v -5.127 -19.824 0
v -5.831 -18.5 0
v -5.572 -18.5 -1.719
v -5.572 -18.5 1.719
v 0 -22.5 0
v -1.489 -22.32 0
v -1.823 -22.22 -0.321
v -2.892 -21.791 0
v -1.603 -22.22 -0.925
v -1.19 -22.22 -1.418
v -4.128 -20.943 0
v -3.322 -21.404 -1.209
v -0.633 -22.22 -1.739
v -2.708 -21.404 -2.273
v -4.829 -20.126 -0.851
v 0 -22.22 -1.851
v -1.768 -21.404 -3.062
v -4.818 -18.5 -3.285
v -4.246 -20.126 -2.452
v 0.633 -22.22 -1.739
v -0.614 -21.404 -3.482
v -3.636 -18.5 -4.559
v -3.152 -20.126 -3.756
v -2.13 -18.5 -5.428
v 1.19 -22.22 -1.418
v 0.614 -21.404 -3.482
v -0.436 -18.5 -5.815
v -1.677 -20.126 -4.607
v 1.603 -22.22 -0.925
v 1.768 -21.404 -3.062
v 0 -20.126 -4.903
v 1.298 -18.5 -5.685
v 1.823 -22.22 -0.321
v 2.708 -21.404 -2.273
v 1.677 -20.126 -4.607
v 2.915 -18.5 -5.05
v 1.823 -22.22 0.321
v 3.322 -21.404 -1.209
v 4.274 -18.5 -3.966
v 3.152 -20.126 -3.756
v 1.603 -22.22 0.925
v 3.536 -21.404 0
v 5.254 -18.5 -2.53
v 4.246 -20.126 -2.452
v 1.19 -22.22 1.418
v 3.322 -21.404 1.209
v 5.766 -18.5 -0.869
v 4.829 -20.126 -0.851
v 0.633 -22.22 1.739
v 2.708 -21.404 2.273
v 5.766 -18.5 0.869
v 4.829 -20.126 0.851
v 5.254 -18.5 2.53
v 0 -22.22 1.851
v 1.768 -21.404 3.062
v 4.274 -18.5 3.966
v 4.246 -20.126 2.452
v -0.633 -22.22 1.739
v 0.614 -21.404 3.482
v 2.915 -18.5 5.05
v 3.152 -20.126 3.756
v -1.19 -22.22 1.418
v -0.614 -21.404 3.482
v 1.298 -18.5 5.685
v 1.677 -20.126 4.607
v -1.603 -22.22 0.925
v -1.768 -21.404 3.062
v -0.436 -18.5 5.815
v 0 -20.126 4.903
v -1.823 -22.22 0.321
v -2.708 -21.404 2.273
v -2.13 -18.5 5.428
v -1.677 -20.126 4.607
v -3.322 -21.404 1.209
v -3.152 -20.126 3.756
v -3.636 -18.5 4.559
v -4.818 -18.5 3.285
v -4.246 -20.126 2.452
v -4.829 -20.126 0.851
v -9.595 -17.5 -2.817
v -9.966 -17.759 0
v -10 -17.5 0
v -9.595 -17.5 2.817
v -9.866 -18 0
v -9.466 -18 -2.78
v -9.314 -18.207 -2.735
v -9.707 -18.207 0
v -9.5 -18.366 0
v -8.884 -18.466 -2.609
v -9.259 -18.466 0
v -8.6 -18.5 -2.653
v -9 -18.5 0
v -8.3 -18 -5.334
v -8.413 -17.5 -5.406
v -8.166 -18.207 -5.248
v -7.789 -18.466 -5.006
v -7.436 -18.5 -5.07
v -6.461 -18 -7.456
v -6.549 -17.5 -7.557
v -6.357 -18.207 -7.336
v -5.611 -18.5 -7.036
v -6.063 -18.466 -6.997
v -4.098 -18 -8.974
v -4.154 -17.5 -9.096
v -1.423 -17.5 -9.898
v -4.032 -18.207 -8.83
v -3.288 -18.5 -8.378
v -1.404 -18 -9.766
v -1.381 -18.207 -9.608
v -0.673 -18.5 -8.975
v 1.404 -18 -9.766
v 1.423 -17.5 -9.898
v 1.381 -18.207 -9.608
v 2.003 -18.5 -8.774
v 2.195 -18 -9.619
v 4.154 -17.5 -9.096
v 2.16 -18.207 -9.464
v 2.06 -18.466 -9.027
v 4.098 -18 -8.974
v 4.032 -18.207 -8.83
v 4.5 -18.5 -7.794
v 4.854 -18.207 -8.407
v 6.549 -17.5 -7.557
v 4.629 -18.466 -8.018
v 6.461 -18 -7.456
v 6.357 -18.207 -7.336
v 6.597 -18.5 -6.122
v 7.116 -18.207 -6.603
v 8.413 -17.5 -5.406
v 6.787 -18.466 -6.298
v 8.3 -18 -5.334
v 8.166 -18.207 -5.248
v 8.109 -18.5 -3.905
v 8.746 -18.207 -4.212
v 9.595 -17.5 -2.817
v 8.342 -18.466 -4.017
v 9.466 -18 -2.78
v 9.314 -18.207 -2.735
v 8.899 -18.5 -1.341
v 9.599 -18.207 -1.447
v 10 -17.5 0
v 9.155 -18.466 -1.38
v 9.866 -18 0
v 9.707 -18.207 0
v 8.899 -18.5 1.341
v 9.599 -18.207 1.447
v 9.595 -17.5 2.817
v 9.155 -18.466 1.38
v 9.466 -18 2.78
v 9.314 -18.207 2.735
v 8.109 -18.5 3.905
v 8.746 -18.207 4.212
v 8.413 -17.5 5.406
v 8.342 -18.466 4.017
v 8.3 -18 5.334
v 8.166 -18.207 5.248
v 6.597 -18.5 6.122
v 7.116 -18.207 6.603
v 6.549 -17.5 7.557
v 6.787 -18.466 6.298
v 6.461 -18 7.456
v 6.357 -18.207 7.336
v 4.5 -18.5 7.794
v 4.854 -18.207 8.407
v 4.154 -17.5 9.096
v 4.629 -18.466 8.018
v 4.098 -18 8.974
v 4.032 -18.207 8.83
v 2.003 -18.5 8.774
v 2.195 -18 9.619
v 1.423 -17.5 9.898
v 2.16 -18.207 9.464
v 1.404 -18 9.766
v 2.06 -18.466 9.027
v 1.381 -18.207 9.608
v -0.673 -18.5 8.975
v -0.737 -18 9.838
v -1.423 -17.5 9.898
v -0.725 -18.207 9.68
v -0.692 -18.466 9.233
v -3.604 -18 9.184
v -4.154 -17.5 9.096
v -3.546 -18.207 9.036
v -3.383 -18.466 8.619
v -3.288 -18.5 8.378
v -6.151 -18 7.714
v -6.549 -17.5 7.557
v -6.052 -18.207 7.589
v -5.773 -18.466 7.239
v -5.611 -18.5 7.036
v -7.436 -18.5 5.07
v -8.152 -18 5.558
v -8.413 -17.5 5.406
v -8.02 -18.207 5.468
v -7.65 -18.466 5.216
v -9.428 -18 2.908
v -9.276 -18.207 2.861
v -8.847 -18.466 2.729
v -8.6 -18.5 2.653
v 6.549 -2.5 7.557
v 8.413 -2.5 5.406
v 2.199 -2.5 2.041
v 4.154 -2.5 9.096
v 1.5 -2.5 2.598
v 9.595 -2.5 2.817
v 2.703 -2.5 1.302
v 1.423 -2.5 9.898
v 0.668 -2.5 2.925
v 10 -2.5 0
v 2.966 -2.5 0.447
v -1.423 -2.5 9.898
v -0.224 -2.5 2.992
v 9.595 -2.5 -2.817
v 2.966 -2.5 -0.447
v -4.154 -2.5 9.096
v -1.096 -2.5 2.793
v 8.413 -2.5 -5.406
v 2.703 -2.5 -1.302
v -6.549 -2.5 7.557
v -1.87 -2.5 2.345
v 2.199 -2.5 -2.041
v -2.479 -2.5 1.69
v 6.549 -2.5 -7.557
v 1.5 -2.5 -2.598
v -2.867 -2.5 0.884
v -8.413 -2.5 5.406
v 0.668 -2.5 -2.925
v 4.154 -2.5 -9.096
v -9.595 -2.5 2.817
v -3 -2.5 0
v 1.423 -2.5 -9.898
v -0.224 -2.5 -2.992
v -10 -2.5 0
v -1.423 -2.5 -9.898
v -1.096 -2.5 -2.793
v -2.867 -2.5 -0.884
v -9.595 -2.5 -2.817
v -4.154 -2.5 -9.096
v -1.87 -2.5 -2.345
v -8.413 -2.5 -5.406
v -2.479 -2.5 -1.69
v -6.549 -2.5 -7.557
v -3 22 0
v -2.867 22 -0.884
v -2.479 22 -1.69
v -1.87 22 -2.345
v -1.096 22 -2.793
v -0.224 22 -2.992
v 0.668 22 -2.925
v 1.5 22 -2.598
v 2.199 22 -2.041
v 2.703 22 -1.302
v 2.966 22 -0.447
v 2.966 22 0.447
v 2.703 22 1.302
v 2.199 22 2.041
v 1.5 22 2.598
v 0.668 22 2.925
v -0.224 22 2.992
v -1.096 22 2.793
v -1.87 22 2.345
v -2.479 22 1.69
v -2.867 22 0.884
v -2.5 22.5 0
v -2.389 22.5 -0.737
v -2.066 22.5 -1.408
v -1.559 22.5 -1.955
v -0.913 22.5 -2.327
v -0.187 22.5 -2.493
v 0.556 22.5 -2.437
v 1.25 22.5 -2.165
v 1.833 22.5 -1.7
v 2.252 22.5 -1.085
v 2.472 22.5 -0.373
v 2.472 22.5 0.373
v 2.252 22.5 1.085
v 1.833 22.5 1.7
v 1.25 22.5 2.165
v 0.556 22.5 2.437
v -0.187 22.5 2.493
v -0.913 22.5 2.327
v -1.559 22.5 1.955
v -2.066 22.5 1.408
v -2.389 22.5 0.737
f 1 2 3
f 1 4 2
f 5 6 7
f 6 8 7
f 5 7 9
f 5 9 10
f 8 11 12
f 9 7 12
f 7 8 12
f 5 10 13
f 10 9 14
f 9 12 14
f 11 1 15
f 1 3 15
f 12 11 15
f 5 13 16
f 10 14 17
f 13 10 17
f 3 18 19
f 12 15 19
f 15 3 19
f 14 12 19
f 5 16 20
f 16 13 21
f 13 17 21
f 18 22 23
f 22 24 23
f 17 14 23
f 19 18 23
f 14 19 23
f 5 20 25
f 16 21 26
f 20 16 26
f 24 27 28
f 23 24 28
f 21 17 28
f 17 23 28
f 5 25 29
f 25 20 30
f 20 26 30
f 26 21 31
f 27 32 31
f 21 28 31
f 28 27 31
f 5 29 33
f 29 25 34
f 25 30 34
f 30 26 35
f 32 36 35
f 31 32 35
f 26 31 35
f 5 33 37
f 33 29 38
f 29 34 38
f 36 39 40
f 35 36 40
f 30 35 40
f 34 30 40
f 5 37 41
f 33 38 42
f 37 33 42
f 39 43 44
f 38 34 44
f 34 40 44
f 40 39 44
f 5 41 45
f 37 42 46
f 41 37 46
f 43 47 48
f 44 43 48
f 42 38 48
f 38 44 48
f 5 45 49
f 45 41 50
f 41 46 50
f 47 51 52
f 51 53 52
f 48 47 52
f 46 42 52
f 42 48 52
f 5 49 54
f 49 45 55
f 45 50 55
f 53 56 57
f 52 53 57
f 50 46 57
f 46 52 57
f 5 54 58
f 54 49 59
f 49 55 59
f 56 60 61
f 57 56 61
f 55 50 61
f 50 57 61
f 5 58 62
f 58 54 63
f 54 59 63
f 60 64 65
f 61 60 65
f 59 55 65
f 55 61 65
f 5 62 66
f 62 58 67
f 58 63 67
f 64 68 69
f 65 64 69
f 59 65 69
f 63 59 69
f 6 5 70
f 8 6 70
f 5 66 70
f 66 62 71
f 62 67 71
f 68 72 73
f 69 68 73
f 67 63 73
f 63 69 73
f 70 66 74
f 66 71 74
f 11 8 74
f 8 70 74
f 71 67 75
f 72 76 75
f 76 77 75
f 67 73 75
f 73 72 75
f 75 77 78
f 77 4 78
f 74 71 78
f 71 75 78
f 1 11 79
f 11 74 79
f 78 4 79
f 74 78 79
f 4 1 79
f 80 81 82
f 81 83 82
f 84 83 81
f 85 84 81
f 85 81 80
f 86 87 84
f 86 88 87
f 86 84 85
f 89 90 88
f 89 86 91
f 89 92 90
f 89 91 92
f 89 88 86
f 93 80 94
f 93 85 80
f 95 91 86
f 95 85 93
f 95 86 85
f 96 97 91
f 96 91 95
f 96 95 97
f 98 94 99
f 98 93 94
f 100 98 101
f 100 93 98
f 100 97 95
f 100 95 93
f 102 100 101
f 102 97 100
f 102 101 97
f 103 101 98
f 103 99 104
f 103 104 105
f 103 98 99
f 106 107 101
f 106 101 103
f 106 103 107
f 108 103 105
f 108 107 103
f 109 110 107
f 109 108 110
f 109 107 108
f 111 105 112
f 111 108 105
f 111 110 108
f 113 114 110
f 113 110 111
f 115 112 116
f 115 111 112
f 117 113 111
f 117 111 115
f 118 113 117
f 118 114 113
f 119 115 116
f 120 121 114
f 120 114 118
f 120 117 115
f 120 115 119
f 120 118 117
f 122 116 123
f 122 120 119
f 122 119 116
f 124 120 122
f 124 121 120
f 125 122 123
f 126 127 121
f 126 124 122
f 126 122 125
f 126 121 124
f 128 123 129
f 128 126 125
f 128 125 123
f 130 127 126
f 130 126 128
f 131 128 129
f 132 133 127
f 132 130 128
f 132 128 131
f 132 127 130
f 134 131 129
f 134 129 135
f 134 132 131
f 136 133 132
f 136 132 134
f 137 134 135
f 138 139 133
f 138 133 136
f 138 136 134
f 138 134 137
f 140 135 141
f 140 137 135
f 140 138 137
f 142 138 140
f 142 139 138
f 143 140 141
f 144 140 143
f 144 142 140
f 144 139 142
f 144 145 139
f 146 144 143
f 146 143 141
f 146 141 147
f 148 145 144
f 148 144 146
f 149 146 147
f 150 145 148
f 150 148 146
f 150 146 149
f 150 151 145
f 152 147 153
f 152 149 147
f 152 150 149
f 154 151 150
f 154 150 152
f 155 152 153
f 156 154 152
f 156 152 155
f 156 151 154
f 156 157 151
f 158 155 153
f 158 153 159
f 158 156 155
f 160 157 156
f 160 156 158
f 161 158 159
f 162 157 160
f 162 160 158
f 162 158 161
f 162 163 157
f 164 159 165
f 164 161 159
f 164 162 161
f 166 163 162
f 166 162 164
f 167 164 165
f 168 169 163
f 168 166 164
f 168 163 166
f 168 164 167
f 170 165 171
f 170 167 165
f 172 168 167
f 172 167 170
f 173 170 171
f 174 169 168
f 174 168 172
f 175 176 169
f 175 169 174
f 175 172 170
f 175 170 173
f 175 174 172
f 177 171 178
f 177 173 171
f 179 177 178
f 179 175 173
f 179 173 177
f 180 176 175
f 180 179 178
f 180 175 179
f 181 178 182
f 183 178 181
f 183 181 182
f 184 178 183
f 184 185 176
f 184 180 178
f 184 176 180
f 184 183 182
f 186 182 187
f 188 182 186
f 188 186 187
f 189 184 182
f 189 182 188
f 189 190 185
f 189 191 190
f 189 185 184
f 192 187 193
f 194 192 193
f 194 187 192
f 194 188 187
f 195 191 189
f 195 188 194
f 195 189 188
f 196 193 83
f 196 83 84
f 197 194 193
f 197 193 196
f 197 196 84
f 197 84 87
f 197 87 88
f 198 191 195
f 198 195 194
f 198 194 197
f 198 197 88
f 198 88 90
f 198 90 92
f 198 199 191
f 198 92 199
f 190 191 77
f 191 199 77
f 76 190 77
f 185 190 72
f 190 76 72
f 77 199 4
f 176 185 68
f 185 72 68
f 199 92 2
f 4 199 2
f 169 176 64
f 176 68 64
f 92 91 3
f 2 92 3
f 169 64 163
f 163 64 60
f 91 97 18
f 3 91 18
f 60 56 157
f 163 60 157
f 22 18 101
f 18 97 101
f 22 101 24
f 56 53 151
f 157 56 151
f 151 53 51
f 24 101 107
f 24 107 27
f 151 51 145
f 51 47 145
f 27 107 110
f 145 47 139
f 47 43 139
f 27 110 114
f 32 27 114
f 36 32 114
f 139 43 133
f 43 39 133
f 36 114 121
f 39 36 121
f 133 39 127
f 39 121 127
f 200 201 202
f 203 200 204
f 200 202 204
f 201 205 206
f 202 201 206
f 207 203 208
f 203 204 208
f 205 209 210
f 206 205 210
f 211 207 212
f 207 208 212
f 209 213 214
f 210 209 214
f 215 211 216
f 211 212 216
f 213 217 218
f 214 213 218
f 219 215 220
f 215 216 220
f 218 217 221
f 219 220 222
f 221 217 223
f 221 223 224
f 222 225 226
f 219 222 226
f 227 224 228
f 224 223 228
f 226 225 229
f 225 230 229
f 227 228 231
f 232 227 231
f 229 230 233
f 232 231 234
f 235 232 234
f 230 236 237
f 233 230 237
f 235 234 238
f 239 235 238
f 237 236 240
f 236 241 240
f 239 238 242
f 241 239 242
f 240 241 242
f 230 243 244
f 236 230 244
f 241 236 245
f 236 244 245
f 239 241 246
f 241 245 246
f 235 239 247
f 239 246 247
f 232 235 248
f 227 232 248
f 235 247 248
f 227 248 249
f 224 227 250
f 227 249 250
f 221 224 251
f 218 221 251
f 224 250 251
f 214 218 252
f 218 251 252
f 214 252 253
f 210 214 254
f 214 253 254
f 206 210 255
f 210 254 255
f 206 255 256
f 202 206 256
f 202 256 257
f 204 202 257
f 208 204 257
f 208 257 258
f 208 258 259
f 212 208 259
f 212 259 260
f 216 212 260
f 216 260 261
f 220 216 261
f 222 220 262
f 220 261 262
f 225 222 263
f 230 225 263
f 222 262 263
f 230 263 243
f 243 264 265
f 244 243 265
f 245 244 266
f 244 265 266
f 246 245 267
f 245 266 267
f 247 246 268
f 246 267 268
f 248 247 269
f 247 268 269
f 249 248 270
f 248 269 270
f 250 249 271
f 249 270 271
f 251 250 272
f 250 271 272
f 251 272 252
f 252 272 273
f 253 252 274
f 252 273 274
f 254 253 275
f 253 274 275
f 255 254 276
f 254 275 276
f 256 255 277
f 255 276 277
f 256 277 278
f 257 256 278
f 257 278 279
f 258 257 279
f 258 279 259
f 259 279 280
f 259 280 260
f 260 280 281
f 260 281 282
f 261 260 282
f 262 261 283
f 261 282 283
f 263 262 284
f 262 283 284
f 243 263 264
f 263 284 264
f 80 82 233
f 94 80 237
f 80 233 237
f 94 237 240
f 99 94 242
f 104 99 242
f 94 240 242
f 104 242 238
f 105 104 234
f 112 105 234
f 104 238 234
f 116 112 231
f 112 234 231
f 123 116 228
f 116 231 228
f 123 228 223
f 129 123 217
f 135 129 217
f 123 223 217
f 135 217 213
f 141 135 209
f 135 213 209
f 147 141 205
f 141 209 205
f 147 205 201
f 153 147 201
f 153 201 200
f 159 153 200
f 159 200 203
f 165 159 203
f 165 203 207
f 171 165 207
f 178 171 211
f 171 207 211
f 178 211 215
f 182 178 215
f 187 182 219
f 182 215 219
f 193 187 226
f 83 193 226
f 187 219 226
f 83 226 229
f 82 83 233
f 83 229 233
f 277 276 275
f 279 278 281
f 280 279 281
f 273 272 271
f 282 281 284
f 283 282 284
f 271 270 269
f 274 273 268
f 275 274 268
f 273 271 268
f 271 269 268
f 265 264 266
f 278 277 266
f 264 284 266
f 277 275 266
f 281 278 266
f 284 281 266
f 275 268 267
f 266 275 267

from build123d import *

# Parameters (mm, degrees)
CHANFREIN1_SIZE = 0.5
CONG_1_R        = 1


with BuildPart() as part:
    # Esquisse1 → Révolution1 (revolve)
    with BuildSketch(Plane.XY):
        with BuildLine():
            Line((-5.830951895, -18.5), (-10, -18.5))
            Line((-10, -18.5), (-10, -2.5))
            Line((-10, -2.5), (-3, -2.5))
            Line((-3, -2.5), (-3, 22.5))
            Line((-3, 22.5), (0, 22.5))
            Line((0, 22.5), (0, -22.5))
            ThreePointArc((0, -22.5), (-3.535533906, -21.403882032), (-5.830951895, -18.5))
        make_face()
    revolve(axis=Axis((0, 22.5, 0), (0, -1, 0)))

    # Chanfrein1
    chanfrein1_edges = [part.edges().sort_by_distance(p)[0] for p in [
        (3, 22.5, 0),
    ]]
    chamfer(chanfrein1_edges, length=CHANFREIN1_SIZE)

    # Congé1
    cong_1_edges = [part.edges().sort_by_distance(p)[0] for p in [
        (10, -18.5, 0),
    ]]
    fillet(cong_1_edges, radius=CONG_1_R)


solid = part.part
